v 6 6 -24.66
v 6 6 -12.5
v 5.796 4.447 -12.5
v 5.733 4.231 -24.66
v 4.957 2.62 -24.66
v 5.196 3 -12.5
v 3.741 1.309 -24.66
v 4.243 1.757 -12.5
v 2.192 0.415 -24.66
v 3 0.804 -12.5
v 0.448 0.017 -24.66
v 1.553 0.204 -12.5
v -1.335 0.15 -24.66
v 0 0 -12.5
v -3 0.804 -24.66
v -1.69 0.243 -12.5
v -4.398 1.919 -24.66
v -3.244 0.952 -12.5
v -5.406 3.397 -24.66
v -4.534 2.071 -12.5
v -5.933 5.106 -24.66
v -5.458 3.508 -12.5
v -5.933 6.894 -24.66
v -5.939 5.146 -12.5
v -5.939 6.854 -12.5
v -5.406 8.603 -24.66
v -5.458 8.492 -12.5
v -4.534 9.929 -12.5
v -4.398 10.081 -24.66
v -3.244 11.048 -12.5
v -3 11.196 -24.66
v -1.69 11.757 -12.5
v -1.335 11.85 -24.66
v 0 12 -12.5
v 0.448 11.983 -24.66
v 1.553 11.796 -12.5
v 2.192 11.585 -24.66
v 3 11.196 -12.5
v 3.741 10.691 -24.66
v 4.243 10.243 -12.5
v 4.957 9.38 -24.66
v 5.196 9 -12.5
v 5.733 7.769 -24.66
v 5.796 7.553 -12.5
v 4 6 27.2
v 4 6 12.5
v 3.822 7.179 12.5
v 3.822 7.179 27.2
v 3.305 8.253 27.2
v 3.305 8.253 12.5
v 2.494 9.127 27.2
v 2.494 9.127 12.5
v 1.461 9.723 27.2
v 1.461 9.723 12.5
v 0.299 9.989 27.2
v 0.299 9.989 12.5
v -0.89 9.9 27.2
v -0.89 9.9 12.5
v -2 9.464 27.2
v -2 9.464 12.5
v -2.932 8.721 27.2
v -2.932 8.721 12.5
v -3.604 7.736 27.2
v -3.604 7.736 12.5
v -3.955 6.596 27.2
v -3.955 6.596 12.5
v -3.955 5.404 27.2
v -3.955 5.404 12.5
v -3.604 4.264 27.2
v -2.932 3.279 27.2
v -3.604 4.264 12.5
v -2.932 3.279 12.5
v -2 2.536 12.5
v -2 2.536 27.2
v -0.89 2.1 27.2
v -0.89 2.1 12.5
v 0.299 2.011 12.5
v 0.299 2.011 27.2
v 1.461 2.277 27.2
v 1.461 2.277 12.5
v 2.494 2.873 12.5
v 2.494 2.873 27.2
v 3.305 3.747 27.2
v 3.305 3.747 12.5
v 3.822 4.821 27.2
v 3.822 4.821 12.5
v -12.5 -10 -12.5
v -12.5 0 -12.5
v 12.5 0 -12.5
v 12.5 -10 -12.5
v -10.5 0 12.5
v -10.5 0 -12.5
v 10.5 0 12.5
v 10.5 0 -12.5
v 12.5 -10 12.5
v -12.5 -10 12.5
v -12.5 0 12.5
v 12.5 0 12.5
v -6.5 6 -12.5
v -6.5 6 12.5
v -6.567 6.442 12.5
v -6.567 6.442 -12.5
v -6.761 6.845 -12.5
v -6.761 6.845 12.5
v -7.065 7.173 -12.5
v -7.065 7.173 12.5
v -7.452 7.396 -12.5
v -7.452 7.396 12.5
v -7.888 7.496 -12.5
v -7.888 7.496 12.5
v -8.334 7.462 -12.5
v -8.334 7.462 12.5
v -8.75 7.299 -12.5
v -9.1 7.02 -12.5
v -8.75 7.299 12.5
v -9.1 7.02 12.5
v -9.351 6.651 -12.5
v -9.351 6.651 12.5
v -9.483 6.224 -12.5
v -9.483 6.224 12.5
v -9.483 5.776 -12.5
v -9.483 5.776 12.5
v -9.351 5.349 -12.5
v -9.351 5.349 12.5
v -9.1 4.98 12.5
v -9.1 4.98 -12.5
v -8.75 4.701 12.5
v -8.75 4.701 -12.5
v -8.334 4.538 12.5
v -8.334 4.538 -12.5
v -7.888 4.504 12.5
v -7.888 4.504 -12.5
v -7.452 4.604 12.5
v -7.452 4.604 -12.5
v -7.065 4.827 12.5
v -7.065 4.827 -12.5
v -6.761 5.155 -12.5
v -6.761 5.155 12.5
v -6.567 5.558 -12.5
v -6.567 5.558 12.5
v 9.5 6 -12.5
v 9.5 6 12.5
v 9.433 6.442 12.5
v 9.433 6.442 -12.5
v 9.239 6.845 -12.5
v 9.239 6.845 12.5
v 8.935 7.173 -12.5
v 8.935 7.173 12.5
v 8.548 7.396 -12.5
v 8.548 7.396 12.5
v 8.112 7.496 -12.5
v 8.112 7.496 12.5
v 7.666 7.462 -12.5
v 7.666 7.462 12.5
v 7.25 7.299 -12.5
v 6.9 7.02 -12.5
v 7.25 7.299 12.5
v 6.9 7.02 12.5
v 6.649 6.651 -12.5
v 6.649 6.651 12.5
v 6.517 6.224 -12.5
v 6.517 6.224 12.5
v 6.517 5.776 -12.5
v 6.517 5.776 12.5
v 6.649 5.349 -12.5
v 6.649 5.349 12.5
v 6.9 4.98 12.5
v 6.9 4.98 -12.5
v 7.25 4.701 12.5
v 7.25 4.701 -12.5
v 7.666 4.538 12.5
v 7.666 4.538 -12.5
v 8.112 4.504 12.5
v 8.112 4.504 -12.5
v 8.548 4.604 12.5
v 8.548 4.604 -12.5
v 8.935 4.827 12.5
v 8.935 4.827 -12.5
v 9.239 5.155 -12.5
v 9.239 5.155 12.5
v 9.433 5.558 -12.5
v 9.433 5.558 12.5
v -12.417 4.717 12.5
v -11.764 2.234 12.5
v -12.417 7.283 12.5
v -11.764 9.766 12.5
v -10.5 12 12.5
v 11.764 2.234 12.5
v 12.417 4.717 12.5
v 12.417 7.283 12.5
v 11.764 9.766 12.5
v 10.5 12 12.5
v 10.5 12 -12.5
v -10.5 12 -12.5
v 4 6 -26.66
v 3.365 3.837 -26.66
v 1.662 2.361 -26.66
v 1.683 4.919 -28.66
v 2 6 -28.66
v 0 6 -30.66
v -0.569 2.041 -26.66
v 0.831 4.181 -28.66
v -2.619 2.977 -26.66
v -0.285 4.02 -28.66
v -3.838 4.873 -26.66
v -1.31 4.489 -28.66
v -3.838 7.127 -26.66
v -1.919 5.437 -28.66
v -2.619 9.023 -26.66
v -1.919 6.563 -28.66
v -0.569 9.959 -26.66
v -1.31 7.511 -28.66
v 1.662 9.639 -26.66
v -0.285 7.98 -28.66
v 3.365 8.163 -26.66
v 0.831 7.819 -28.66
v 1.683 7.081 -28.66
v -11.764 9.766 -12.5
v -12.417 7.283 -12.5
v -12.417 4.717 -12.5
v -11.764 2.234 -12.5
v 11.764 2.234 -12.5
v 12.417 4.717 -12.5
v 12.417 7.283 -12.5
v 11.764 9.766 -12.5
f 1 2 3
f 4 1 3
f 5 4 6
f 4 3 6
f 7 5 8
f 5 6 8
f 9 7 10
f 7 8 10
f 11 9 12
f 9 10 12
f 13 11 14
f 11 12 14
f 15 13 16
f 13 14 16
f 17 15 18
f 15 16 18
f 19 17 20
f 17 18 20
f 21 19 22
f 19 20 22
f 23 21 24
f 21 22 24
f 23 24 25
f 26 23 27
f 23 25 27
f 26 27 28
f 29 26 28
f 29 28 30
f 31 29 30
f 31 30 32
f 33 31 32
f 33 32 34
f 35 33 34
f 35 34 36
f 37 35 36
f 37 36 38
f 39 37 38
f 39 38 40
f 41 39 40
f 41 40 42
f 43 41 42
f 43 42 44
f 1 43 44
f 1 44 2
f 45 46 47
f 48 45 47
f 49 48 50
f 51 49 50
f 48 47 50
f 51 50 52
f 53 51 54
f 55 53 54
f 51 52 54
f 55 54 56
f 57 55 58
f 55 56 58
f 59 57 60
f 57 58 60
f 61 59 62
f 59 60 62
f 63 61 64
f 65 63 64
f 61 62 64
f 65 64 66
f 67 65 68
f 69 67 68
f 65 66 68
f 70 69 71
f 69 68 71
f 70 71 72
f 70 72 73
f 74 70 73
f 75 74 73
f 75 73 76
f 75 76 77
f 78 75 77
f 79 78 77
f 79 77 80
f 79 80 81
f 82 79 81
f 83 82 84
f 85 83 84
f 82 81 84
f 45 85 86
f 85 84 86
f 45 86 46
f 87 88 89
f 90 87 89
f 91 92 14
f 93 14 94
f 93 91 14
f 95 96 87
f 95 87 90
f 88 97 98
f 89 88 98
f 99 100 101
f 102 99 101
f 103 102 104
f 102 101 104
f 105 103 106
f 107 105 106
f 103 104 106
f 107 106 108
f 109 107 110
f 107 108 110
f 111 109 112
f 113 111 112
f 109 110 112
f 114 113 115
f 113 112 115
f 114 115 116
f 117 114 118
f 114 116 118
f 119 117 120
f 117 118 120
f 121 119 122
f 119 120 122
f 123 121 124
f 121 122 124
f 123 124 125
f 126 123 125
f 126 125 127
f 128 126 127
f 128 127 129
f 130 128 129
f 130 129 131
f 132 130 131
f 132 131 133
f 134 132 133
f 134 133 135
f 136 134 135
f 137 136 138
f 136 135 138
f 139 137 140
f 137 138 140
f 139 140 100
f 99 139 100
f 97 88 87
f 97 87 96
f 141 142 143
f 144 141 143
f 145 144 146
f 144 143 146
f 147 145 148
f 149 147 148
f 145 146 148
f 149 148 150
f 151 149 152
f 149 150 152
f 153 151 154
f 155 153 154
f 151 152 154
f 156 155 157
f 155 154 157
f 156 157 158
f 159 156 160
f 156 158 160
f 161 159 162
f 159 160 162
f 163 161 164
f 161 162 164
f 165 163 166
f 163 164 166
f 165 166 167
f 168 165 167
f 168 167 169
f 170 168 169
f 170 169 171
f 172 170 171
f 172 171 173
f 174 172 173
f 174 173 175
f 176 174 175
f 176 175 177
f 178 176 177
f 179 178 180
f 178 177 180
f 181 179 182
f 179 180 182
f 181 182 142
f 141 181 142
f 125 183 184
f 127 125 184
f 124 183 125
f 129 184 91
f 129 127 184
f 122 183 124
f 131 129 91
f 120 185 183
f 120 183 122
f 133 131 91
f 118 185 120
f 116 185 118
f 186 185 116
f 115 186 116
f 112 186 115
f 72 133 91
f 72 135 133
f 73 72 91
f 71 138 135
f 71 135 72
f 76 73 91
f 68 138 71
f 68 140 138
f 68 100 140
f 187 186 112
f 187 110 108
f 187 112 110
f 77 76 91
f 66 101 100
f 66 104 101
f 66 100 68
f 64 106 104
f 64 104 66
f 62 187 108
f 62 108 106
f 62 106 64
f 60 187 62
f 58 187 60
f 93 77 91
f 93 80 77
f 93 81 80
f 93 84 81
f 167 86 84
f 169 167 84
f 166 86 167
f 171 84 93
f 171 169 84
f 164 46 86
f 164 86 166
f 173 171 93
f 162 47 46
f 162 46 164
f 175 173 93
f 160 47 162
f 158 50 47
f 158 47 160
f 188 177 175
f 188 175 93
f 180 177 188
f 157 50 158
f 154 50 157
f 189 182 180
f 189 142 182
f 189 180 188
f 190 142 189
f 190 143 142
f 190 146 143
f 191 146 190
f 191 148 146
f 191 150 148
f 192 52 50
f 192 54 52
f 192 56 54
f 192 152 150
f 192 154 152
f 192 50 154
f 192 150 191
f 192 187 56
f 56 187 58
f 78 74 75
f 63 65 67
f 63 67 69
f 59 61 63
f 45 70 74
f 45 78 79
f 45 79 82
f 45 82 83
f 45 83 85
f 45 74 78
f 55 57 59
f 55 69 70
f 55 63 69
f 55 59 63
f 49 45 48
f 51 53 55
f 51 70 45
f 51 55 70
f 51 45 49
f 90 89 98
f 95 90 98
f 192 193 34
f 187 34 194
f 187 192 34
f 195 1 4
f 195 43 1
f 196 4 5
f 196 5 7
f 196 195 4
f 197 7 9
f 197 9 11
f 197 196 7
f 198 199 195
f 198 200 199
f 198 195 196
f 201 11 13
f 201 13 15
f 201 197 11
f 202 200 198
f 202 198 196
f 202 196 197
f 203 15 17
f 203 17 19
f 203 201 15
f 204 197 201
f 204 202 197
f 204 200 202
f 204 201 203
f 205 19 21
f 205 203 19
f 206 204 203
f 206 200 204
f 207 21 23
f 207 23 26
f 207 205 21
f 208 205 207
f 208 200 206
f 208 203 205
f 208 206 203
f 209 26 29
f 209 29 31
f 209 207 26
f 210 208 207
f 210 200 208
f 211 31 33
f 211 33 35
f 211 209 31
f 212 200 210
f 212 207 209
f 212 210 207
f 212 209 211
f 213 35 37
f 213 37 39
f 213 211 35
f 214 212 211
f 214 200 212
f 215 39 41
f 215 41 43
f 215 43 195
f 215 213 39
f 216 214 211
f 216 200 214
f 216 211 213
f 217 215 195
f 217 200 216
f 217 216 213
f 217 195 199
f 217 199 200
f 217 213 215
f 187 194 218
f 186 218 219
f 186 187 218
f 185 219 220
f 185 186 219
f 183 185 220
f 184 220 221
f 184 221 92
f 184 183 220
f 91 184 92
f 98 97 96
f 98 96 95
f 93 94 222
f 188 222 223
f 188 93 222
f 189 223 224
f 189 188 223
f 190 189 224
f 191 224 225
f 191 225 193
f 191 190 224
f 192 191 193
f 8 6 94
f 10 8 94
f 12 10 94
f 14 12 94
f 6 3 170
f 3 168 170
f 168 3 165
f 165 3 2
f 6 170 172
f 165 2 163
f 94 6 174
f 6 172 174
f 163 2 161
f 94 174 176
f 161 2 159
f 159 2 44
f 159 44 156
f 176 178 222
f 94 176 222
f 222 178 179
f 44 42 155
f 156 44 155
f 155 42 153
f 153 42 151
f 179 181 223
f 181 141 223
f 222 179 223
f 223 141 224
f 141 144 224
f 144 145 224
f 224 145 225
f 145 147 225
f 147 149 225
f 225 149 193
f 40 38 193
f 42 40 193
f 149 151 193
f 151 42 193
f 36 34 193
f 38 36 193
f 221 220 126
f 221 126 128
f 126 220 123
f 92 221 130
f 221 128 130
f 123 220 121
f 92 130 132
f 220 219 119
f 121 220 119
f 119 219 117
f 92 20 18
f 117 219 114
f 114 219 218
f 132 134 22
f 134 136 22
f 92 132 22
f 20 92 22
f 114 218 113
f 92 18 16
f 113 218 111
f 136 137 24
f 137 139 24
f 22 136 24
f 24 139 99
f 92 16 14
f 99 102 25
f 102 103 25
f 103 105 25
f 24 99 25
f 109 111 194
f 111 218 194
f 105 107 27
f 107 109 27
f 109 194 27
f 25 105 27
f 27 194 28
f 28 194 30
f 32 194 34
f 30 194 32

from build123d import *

# Parameters (mm, degrees)
F0_W     = 25
F0_H     = 25
F1_DEPTH = 10
F2_R     = 1.5
F3_DEPTH = 25
F4_R     = 4
F5_DEPTH = 14.7
F6_R     = 6
F7_DEPTH = 18.16
F8_SIZE  = 6


with BuildPart() as f1:
    # F0 (on Front) → F1 (new body)
    with BuildSketch(Plane.XZ):
        Rectangle(F0_W, F0_H)
    extrude(amount=F1_DEPTH)


with BuildPart() as f3:
    # F2 (on face) → F3 (new body)
    with BuildSketch(Plane.XY.offset(12.5)):
        with BuildLine():
            Line((10.5, 12), (-10.5, 12))
            ThreePointArc((-10.5, 12), (-12.5, 6), (-10.5, 0))
            Line((-10.5, 0), (10.5, 0))
            ThreePointArc((10.5, 0), (12.5, 6), (10.5, 12))
        make_face()
        with Locations((-8, 6)):
            Circle(F2_R, mode=Mode.SUBTRACT)
        with Locations((8, 6)):
            Circle(F2_R, mode=Mode.SUBTRACT)
    extrude(amount=-F3_DEPTH)

    # F4 (on face) → F5 (join)
    with BuildSketch(Plane.XY.offset(12.5)):
        with Locations((0, 6)):
            Circle(F4_R)
    extrude(amount=F5_DEPTH)

    # F6 (on face) → F7 (join)
    with BuildSketch(Plane(origin=(0, 0, -12.5), x_dir=(1, 0, 0), z_dir=(0, 0, -1))):
        with Locations((0, -6)):
            Circle(F6_R)
    extrude(amount=F7_DEPTH)

    # F8
    f8_edges = [f3.edges().sort_by_distance(p)[0] for p in [
        (-6, 6, -30.66),
    ]]
    chamfer(f8_edges, length=F8_SIZE)


solid = Compound([f1.part, f3.part])
